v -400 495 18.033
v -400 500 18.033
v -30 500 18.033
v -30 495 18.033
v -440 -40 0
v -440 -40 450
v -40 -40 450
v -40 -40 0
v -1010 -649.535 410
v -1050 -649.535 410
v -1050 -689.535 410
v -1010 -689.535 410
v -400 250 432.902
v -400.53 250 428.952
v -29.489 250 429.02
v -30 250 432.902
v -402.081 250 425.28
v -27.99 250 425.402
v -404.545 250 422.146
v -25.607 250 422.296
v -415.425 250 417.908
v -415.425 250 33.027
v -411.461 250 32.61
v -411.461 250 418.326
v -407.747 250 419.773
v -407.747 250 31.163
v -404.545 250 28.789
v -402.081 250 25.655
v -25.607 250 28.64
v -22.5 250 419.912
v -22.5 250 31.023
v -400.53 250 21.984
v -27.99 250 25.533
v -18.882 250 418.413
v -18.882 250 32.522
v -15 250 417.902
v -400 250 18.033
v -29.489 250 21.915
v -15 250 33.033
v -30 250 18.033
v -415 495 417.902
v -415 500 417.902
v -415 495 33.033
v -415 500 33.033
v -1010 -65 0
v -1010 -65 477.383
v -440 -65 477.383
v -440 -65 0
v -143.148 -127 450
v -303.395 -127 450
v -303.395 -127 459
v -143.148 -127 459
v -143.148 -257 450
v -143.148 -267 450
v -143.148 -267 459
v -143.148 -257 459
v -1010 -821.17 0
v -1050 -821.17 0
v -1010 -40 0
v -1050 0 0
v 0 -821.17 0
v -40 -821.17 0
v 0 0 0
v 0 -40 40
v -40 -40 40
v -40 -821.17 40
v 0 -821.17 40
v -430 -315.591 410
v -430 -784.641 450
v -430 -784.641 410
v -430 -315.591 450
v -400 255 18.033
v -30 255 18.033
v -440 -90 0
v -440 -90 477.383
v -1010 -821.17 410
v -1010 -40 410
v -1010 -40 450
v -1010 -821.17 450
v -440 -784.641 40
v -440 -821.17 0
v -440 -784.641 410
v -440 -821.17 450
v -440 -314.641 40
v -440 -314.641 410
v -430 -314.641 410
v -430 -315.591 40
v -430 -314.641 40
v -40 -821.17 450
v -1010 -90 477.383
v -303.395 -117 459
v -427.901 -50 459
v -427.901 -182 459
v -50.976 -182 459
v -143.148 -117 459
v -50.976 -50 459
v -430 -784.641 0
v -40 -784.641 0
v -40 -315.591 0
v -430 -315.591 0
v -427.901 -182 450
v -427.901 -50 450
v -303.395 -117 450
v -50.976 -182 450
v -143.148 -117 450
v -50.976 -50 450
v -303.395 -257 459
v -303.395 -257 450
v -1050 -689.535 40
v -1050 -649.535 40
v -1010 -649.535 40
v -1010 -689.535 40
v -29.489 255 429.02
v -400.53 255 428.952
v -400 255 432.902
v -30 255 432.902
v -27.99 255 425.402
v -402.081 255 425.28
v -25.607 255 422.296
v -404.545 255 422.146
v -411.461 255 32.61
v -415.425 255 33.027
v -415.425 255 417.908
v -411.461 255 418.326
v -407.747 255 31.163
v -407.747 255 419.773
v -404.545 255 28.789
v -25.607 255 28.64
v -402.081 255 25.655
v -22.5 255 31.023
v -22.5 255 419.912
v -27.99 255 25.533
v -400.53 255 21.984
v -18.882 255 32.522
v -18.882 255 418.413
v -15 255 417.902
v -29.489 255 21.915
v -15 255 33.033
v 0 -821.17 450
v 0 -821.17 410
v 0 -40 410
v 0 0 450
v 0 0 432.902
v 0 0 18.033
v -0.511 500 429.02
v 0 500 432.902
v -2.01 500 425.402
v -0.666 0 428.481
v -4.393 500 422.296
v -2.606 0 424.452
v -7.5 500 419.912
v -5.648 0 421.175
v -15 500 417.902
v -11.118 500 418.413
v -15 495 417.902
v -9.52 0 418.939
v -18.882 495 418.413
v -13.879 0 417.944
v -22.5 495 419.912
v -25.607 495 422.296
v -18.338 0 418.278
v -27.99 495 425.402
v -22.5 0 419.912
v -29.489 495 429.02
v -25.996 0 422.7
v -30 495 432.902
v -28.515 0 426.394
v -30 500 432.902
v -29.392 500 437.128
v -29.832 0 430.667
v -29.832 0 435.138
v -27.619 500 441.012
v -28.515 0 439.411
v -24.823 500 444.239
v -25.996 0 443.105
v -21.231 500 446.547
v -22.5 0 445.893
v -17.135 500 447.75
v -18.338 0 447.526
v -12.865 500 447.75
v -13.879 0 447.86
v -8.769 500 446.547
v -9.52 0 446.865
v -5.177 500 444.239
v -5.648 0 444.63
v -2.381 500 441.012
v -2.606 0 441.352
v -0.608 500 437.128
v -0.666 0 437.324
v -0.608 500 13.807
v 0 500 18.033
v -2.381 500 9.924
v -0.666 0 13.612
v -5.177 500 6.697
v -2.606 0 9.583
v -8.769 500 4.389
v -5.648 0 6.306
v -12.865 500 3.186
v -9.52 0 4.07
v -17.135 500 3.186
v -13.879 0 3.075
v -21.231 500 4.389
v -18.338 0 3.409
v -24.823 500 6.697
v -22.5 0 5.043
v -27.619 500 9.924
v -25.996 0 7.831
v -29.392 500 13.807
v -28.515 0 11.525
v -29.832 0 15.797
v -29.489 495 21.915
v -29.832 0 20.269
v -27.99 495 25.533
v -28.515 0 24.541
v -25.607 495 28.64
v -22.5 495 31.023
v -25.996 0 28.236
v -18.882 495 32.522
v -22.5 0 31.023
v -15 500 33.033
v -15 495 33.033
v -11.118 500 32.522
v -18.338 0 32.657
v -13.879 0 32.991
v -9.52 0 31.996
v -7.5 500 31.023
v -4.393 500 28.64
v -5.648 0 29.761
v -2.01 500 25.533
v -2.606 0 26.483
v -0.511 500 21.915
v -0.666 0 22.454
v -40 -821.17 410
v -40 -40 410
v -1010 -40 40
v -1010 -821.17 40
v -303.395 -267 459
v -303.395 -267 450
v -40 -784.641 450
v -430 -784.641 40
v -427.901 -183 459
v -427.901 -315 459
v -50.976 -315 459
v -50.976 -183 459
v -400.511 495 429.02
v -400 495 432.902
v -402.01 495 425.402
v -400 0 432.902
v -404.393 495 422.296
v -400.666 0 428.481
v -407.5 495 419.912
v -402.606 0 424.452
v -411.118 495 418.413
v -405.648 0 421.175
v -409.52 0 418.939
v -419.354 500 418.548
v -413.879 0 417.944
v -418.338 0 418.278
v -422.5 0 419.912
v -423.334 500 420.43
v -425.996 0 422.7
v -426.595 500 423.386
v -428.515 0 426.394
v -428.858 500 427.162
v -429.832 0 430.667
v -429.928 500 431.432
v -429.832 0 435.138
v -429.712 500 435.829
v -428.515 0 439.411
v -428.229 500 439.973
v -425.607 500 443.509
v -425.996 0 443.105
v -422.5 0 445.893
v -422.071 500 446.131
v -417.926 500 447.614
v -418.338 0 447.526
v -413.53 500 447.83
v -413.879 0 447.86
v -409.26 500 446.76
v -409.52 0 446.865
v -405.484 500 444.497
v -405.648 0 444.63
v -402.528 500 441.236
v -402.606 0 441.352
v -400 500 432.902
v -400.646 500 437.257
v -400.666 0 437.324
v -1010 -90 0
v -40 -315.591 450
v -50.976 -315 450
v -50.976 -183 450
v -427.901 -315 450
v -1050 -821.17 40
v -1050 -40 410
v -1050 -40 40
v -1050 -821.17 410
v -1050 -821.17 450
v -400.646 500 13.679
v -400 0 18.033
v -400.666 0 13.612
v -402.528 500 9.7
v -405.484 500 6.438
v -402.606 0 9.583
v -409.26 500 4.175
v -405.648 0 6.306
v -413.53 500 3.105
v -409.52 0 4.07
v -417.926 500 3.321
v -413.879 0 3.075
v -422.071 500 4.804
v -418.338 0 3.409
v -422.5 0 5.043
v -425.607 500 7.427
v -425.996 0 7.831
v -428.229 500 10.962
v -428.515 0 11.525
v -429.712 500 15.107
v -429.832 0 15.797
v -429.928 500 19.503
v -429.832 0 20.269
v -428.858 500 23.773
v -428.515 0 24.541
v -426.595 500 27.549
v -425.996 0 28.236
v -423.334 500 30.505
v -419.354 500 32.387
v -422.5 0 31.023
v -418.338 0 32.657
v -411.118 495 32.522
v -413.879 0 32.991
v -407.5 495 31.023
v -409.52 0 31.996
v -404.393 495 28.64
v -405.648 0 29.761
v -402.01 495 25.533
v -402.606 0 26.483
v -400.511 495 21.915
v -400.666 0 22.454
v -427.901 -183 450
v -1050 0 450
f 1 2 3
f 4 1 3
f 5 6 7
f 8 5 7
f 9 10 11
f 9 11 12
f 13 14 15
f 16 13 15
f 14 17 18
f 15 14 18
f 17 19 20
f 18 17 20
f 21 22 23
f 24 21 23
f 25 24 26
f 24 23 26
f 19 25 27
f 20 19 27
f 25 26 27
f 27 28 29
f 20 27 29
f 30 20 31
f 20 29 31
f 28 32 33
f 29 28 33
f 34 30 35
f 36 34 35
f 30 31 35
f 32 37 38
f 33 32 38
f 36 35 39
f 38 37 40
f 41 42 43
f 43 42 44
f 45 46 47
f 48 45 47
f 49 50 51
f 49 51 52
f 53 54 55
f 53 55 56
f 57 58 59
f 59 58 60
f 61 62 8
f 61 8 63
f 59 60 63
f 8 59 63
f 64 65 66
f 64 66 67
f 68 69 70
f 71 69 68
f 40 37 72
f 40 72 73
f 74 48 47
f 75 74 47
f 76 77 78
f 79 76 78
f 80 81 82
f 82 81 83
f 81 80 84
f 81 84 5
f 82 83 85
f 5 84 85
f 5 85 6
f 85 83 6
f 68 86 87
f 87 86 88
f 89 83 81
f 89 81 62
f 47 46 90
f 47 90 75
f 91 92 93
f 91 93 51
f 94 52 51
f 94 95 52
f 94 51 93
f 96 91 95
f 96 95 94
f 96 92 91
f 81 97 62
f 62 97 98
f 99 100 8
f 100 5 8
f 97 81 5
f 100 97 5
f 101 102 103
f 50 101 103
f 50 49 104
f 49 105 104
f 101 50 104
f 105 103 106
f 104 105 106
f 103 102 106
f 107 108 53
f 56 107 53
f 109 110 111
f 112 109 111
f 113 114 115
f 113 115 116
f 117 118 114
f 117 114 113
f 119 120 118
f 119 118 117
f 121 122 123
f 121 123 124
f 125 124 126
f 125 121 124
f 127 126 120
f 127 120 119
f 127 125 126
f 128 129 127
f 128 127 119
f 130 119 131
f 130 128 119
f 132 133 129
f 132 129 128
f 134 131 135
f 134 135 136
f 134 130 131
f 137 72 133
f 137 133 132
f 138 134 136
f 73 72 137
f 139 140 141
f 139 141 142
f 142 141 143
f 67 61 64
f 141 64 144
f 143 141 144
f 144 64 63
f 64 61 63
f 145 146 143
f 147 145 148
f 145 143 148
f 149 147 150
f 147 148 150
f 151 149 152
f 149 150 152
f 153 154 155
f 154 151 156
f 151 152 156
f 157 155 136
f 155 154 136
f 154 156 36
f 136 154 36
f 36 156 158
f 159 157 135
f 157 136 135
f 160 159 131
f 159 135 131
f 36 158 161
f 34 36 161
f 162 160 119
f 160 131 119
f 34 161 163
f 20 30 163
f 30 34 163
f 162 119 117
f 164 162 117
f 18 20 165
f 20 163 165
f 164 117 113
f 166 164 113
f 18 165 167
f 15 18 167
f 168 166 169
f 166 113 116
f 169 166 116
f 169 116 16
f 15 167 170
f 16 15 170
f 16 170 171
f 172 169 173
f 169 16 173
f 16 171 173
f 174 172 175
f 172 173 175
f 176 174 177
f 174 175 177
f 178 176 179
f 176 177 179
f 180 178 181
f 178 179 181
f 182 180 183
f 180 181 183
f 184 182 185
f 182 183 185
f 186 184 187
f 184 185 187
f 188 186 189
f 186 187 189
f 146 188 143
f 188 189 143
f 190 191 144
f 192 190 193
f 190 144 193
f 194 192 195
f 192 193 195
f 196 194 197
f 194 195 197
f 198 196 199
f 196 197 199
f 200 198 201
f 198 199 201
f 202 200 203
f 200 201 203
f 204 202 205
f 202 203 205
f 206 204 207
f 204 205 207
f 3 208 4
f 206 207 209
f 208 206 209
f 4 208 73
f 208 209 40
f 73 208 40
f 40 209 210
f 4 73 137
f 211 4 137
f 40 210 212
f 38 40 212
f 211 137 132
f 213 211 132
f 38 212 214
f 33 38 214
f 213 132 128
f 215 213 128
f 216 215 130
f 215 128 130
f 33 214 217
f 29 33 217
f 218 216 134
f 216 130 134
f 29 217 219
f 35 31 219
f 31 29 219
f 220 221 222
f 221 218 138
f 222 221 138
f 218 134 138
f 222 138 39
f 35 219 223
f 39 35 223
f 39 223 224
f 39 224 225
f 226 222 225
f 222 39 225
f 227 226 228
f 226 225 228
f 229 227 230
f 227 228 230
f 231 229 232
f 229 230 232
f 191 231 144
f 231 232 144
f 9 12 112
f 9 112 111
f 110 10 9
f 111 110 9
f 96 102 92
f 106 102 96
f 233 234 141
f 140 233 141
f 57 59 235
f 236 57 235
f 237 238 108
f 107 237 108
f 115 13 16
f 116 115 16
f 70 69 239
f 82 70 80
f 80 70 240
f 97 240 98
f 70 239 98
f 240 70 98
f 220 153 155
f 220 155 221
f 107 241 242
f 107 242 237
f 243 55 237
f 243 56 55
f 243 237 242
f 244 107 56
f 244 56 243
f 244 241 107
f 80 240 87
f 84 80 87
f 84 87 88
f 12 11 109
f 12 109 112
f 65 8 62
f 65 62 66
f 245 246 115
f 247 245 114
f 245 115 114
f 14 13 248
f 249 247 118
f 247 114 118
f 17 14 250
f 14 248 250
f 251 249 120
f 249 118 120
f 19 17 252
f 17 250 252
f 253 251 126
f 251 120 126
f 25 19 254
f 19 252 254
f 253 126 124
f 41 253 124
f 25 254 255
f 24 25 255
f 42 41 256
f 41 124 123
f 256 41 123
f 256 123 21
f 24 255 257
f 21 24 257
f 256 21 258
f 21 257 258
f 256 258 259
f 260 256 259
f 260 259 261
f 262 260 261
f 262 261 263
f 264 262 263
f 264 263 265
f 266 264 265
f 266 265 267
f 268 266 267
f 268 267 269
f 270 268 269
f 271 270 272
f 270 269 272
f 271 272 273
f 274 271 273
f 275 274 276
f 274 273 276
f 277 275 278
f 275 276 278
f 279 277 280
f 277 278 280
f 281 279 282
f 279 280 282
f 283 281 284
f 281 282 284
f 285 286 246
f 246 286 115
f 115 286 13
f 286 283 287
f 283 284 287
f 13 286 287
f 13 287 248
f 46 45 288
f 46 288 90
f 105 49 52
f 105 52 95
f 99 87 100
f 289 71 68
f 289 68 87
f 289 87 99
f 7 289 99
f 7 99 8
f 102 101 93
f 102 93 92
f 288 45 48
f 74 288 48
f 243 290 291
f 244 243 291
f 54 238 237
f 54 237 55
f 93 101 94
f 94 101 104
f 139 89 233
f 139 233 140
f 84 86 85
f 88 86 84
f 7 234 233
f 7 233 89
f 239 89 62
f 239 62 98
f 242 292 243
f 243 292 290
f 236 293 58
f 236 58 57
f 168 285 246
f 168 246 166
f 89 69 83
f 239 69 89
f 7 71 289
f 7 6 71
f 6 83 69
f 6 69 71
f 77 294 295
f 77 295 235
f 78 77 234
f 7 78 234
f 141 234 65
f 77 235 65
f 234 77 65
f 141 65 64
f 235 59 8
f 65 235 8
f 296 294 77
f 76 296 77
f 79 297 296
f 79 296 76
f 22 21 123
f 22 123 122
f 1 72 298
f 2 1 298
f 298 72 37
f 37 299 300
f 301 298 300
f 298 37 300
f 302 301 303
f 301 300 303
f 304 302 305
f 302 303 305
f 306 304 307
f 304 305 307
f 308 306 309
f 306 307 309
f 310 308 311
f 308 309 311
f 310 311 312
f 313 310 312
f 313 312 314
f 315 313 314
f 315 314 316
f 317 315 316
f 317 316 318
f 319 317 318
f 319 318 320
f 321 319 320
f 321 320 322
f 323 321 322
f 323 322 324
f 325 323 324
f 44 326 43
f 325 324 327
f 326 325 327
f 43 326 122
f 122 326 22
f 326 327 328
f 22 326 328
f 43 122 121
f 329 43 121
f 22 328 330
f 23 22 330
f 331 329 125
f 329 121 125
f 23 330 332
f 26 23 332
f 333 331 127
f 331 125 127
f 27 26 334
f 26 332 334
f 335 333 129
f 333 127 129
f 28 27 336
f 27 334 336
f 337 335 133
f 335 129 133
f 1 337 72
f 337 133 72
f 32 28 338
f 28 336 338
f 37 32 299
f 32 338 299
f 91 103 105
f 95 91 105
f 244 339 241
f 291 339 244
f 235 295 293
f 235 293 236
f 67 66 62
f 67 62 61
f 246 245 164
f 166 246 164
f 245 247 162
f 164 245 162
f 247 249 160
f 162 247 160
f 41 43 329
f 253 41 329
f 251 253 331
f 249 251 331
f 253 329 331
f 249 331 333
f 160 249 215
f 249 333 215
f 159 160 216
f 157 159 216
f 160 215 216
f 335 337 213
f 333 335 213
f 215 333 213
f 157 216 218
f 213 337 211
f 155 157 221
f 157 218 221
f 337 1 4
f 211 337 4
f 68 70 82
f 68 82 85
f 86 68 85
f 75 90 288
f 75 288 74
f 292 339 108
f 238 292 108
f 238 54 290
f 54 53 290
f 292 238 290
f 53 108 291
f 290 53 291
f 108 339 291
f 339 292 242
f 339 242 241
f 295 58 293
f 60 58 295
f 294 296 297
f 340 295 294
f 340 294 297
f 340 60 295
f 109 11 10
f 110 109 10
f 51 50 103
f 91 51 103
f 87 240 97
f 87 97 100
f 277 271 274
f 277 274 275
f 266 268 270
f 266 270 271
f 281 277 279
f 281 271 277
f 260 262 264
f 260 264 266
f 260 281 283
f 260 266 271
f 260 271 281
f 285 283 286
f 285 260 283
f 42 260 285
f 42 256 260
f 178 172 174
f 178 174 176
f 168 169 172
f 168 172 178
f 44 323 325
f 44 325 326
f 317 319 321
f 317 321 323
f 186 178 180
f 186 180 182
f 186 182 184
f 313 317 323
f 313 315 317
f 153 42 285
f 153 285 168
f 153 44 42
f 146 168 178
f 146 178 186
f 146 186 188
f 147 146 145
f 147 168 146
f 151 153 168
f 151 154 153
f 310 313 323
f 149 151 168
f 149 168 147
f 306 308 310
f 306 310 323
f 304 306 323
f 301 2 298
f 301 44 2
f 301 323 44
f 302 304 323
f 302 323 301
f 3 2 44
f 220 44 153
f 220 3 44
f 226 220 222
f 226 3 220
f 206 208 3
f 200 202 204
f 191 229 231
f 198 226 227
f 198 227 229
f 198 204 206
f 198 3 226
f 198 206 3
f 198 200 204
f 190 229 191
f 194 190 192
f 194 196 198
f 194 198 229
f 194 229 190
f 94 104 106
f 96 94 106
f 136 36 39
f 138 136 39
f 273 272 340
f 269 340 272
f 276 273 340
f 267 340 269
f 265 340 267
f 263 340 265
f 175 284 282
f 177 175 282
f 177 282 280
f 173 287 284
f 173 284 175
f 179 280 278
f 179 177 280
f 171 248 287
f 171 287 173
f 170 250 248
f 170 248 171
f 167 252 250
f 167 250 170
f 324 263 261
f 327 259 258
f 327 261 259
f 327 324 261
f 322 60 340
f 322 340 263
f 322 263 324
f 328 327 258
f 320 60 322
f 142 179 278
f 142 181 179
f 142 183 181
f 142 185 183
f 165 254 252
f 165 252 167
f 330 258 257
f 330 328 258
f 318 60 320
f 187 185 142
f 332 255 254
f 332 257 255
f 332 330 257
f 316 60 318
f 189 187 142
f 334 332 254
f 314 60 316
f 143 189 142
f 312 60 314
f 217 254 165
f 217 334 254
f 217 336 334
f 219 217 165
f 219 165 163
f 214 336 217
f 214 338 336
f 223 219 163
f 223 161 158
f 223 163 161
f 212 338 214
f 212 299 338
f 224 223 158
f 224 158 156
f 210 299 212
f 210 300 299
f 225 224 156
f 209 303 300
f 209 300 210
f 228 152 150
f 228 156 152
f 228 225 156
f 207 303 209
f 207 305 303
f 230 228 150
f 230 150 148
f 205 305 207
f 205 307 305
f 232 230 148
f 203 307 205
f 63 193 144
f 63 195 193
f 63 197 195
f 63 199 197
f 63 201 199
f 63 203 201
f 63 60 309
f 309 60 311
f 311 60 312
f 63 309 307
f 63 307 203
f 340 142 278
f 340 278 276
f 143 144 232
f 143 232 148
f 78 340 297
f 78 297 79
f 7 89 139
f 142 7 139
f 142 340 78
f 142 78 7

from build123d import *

# Parameters (mm, degrees)
SKETCH1_W               = 1050
SKETCH1_H               = 40
BOSS_EXTRUDE1_DEPTH     = 450
SKETCH2_W               = 40
SKETCH2_H               = 40
BOSS_EXTRUDE2_DEPTH     = 781.17
SKETCH3_W               = 400
SKETCH3_H               = 781.17
BOSS_EXTRUDE3_DEPTH     = 450
SKETCH4_W               = 570
SKETCH4_H               = 477.383383723
BOSS_EXTRUDE4_DEPTH     = 50
SKETCH5_W               = 376.924947462
SKETCH5_H               = 132
SKETCH5_W_2             = 160.246518918
SKETCH5_H_2             = 10
BOSS_EXTRUDE5_DEPTH     = 9
BOSS_EXTRUDE5_2_DEPTH   = 9
BOSS_EXTRUDE5_3_DEPTH   = 9
SKETCH6_W               = 390
SKETCH6_H               = 469.049896927
CUT_EXTRUDE1_DEPTH      = 358
CUT_EXTRUDE1_DEPTH_BACK = 451
SKETCH7_W               = 370
SKETCH7_H               = 470
CUT_EXTRUDE2_DEPTH      = 10
SKETCH8_W               = 40
SKETCH8_H               = 40
BOSS_EXTRUDE6_DEPTH     = 370
SKETCH9_W               = 570
SKETCH9_H               = 25
CUT_EXTRUDE3_DEPTH      = 478.383383723
SKETCH10_R              = 15
BOSS_EXTRUDE7_DEPTH     = 500
SKETCH11_W              = 400
SKETCH11_H              = 414.869163102
BOSS_EXTRUDE8_DEPTH     = 5
SKETCH12_W              = 400.424919487
SKETCH12_H              = 414.869163102
BOSS_EXTRUDE9_DEPTH     = 5


with BuildPart() as part:
    # Sketch1 → Boss-Extrude1 (new body)
    with BuildSketch(Plane.XY):
        with Locations((-525, -20)):
            Rectangle(SKETCH1_W, SKETCH1_H)
    extrude(amount=BOSS_EXTRUDE1_DEPTH)

    # Sketch2 → Boss-Extrude2 (add)
    with BuildSketch(Plane.XZ.offset(40)):
        with Locations((-1030, 430)):
            Rectangle(SKETCH2_W, SKETCH2_H)
        with Locations((-1030, 20)):
            Rectangle(SKETCH2_W, SKETCH2_H)
        with Locations((-20, 20)):
            Rectangle(SKETCH2_W, SKETCH2_H)
        with Locations((-20, 430)):
            Rectangle(SKETCH2_W, SKETCH2_H)
    extrude(amount=BOSS_EXTRUDE2_DEPTH)

    # Sketch10 → Boss-Extrude7 (add)
    with BuildSketch(Plane(origin=(0, 0, 0), x_dir=(1, 0, 0), z_dir=(0, 1, 0))):
        with Locations((-15, -432.902277584)):
            Circle(SKETCH10_R)
        with Locations((-15, -18.033114482)):
            Circle(SKETCH10_R)
        with Locations((-415, -432.902277584)):
            Circle(SKETCH10_R)
        with Locations((-415, -18.033114482)):
            Circle(SKETCH10_R)
    extrude(amount=BOSS_EXTRUDE7_DEPTH)

    # Sketch11 → Boss-Extrude8 (add)
    with BuildSketch(Plane(origin=(0, 500, 0), x_dir=(1, 0, 0), z_dir=(0, 1, 0))):
        with Locations((-215, -225.467696033)):
            Rectangle(SKETCH11_W, SKETCH11_H)
    extrude(amount=-BOSS_EXTRUDE8_DEPTH)

    # Sketch12 → Boss-Extrude9 (add)
    with BuildSketch(Plane(origin=(0, 250, 0), x_dir=(1, 0, 0), z_dir=(0, 1, 0))):
        with Locations((-215.212459744, -225.467696033)):
            Rectangle(SKETCH12_W, SKETCH12_H)
    extrude(amount=BOSS_EXTRUDE9_DEPTH)


with BuildPart() as body_2:
    # Sketch3 → Boss-Extrude3 (new body)
    with BuildSketch(Plane.XY.offset(450)):
        with Locations((-240, -430.585)):
            Rectangle(SKETCH3_W, SKETCH3_H)
    extrude(amount=-BOSS_EXTRUDE3_DEPTH)


with BuildPart() as body_3:
    # Sketch4 → Boss-Extrude4 (new body)
    with BuildSketch(Plane.XZ.offset(40)):
        with Locations((-725, 238.691691862)):
            Rectangle(SKETCH4_W, SKETCH4_H)
    extrude(amount=BOSS_EXTRUDE4_DEPTH)

    # Sketch9 → Cut-Extrude3 (cut, through all)
    with BuildSketch(Plane.XY.offset(477.383383723)):
        with Locations((-725, -52.5)):
            Rectangle(SKETCH9_W, SKETCH9_H)
    extrude(amount=-CUT_EXTRUDE3_DEPTH, mode=Mode.SUBTRACT)


with BuildPart() as body_4:
    # Sketch5 → Boss-Extrude5 (new body)
    with BuildSketch(Plane.XY.offset(450)):
        with Locations((-239.438560154, -382)):
            Rectangle(SKETCH5_W, SKETCH5_H)
        with Locations((-223.271719618, -402)):
            Rectangle(SKETCH5_W_2, SKETCH5_H_2, mode=Mode.SUBTRACT)
    extrude(amount=BOSS_EXTRUDE5_DEPTH)


with BuildPart() as body_5:
    # Sketch5 → Boss-Extrude5 2 (new body)
    with BuildSketch(Plane.XY.offset(450)):
        with Locations((-239.438560154, -249)):
            Rectangle(SKETCH5_W, SKETCH5_H)
        with Locations((-223.271719618, -262)):
            Rectangle(SKETCH5_W_2, SKETCH5_H_2, mode=Mode.SUBTRACT)
    extrude(amount=BOSS_EXTRUDE5_2_DEPTH)


with BuildPart() as body_6:
    # Sketch5 → Boss-Extrude5 3 (new body)
    with BuildSketch(Plane.XY.offset(450)):
        with Locations((-239.438560154, -116)):
            Rectangle(SKETCH5_W, SKETCH5_H)
        with Locations((-223.271719618, -122)):
            Rectangle(SKETCH5_W_2, SKETCH5_H_2, mode=Mode.SUBTRACT)
    extrude(amount=BOSS_EXTRUDE5_3_DEPTH)


with BuildPart() as cut_extrude1_tool:
    # Sketch6 → Cut-Extrude1 (new body, two sides)
    with BuildSketch(Plane.XY.offset(450)) as cut_extrude1_sk:
        with Locations((-235, -550.116171594)):
            Rectangle(SKETCH6_W, SKETCH6_H)
    extrude(amount=CUT_EXTRUDE1_DEPTH)
    extrude(cut_extrude1_sk.sketch, amount=-CUT_EXTRUDE1_DEPTH_BACK)


with BuildPart() as body_2_1:
    add(body_2.part)

    # Cut-Extrude1: cut by cut_extrude1_tool
    add(cut_extrude1_tool.part, mode=Mode.SUBTRACT)

    # Sketch7 → Cut-Extrude2 (cut)
    with BuildSketch(Plane(origin=(-430, 0, 0), x_dir=(0, 0, -1), z_dir=(1, 0, 0))):
        with Locations((-225, -549.641120058)):
            Rectangle(SKETCH7_W, SKETCH7_H)
    extrude(amount=-CUT_EXTRUDE2_DEPTH, mode=Mode.SUBTRACT)


with BuildPart() as body_4_1:
    add(body_4.part)

    # Cut-Extrude1: cut by cut_extrude1_tool
    add(cut_extrude1_tool.part, mode=Mode.SUBTRACT)


with BuildPart() as body_6_2:
    # Sketch8 → Boss-Extrude6 (new body)
    with BuildSketch(Plane.XY.offset(40)):
        with Locations((-1030, -669.535034358)):
            Rectangle(SKETCH8_W, SKETCH8_H)
    extrude(amount=BOSS_EXTRUDE6_DEPTH)


solid = Compound([part.part, body_3.part, body_5.part, body_6.part, body_2_1.part, body_6_2.part])
